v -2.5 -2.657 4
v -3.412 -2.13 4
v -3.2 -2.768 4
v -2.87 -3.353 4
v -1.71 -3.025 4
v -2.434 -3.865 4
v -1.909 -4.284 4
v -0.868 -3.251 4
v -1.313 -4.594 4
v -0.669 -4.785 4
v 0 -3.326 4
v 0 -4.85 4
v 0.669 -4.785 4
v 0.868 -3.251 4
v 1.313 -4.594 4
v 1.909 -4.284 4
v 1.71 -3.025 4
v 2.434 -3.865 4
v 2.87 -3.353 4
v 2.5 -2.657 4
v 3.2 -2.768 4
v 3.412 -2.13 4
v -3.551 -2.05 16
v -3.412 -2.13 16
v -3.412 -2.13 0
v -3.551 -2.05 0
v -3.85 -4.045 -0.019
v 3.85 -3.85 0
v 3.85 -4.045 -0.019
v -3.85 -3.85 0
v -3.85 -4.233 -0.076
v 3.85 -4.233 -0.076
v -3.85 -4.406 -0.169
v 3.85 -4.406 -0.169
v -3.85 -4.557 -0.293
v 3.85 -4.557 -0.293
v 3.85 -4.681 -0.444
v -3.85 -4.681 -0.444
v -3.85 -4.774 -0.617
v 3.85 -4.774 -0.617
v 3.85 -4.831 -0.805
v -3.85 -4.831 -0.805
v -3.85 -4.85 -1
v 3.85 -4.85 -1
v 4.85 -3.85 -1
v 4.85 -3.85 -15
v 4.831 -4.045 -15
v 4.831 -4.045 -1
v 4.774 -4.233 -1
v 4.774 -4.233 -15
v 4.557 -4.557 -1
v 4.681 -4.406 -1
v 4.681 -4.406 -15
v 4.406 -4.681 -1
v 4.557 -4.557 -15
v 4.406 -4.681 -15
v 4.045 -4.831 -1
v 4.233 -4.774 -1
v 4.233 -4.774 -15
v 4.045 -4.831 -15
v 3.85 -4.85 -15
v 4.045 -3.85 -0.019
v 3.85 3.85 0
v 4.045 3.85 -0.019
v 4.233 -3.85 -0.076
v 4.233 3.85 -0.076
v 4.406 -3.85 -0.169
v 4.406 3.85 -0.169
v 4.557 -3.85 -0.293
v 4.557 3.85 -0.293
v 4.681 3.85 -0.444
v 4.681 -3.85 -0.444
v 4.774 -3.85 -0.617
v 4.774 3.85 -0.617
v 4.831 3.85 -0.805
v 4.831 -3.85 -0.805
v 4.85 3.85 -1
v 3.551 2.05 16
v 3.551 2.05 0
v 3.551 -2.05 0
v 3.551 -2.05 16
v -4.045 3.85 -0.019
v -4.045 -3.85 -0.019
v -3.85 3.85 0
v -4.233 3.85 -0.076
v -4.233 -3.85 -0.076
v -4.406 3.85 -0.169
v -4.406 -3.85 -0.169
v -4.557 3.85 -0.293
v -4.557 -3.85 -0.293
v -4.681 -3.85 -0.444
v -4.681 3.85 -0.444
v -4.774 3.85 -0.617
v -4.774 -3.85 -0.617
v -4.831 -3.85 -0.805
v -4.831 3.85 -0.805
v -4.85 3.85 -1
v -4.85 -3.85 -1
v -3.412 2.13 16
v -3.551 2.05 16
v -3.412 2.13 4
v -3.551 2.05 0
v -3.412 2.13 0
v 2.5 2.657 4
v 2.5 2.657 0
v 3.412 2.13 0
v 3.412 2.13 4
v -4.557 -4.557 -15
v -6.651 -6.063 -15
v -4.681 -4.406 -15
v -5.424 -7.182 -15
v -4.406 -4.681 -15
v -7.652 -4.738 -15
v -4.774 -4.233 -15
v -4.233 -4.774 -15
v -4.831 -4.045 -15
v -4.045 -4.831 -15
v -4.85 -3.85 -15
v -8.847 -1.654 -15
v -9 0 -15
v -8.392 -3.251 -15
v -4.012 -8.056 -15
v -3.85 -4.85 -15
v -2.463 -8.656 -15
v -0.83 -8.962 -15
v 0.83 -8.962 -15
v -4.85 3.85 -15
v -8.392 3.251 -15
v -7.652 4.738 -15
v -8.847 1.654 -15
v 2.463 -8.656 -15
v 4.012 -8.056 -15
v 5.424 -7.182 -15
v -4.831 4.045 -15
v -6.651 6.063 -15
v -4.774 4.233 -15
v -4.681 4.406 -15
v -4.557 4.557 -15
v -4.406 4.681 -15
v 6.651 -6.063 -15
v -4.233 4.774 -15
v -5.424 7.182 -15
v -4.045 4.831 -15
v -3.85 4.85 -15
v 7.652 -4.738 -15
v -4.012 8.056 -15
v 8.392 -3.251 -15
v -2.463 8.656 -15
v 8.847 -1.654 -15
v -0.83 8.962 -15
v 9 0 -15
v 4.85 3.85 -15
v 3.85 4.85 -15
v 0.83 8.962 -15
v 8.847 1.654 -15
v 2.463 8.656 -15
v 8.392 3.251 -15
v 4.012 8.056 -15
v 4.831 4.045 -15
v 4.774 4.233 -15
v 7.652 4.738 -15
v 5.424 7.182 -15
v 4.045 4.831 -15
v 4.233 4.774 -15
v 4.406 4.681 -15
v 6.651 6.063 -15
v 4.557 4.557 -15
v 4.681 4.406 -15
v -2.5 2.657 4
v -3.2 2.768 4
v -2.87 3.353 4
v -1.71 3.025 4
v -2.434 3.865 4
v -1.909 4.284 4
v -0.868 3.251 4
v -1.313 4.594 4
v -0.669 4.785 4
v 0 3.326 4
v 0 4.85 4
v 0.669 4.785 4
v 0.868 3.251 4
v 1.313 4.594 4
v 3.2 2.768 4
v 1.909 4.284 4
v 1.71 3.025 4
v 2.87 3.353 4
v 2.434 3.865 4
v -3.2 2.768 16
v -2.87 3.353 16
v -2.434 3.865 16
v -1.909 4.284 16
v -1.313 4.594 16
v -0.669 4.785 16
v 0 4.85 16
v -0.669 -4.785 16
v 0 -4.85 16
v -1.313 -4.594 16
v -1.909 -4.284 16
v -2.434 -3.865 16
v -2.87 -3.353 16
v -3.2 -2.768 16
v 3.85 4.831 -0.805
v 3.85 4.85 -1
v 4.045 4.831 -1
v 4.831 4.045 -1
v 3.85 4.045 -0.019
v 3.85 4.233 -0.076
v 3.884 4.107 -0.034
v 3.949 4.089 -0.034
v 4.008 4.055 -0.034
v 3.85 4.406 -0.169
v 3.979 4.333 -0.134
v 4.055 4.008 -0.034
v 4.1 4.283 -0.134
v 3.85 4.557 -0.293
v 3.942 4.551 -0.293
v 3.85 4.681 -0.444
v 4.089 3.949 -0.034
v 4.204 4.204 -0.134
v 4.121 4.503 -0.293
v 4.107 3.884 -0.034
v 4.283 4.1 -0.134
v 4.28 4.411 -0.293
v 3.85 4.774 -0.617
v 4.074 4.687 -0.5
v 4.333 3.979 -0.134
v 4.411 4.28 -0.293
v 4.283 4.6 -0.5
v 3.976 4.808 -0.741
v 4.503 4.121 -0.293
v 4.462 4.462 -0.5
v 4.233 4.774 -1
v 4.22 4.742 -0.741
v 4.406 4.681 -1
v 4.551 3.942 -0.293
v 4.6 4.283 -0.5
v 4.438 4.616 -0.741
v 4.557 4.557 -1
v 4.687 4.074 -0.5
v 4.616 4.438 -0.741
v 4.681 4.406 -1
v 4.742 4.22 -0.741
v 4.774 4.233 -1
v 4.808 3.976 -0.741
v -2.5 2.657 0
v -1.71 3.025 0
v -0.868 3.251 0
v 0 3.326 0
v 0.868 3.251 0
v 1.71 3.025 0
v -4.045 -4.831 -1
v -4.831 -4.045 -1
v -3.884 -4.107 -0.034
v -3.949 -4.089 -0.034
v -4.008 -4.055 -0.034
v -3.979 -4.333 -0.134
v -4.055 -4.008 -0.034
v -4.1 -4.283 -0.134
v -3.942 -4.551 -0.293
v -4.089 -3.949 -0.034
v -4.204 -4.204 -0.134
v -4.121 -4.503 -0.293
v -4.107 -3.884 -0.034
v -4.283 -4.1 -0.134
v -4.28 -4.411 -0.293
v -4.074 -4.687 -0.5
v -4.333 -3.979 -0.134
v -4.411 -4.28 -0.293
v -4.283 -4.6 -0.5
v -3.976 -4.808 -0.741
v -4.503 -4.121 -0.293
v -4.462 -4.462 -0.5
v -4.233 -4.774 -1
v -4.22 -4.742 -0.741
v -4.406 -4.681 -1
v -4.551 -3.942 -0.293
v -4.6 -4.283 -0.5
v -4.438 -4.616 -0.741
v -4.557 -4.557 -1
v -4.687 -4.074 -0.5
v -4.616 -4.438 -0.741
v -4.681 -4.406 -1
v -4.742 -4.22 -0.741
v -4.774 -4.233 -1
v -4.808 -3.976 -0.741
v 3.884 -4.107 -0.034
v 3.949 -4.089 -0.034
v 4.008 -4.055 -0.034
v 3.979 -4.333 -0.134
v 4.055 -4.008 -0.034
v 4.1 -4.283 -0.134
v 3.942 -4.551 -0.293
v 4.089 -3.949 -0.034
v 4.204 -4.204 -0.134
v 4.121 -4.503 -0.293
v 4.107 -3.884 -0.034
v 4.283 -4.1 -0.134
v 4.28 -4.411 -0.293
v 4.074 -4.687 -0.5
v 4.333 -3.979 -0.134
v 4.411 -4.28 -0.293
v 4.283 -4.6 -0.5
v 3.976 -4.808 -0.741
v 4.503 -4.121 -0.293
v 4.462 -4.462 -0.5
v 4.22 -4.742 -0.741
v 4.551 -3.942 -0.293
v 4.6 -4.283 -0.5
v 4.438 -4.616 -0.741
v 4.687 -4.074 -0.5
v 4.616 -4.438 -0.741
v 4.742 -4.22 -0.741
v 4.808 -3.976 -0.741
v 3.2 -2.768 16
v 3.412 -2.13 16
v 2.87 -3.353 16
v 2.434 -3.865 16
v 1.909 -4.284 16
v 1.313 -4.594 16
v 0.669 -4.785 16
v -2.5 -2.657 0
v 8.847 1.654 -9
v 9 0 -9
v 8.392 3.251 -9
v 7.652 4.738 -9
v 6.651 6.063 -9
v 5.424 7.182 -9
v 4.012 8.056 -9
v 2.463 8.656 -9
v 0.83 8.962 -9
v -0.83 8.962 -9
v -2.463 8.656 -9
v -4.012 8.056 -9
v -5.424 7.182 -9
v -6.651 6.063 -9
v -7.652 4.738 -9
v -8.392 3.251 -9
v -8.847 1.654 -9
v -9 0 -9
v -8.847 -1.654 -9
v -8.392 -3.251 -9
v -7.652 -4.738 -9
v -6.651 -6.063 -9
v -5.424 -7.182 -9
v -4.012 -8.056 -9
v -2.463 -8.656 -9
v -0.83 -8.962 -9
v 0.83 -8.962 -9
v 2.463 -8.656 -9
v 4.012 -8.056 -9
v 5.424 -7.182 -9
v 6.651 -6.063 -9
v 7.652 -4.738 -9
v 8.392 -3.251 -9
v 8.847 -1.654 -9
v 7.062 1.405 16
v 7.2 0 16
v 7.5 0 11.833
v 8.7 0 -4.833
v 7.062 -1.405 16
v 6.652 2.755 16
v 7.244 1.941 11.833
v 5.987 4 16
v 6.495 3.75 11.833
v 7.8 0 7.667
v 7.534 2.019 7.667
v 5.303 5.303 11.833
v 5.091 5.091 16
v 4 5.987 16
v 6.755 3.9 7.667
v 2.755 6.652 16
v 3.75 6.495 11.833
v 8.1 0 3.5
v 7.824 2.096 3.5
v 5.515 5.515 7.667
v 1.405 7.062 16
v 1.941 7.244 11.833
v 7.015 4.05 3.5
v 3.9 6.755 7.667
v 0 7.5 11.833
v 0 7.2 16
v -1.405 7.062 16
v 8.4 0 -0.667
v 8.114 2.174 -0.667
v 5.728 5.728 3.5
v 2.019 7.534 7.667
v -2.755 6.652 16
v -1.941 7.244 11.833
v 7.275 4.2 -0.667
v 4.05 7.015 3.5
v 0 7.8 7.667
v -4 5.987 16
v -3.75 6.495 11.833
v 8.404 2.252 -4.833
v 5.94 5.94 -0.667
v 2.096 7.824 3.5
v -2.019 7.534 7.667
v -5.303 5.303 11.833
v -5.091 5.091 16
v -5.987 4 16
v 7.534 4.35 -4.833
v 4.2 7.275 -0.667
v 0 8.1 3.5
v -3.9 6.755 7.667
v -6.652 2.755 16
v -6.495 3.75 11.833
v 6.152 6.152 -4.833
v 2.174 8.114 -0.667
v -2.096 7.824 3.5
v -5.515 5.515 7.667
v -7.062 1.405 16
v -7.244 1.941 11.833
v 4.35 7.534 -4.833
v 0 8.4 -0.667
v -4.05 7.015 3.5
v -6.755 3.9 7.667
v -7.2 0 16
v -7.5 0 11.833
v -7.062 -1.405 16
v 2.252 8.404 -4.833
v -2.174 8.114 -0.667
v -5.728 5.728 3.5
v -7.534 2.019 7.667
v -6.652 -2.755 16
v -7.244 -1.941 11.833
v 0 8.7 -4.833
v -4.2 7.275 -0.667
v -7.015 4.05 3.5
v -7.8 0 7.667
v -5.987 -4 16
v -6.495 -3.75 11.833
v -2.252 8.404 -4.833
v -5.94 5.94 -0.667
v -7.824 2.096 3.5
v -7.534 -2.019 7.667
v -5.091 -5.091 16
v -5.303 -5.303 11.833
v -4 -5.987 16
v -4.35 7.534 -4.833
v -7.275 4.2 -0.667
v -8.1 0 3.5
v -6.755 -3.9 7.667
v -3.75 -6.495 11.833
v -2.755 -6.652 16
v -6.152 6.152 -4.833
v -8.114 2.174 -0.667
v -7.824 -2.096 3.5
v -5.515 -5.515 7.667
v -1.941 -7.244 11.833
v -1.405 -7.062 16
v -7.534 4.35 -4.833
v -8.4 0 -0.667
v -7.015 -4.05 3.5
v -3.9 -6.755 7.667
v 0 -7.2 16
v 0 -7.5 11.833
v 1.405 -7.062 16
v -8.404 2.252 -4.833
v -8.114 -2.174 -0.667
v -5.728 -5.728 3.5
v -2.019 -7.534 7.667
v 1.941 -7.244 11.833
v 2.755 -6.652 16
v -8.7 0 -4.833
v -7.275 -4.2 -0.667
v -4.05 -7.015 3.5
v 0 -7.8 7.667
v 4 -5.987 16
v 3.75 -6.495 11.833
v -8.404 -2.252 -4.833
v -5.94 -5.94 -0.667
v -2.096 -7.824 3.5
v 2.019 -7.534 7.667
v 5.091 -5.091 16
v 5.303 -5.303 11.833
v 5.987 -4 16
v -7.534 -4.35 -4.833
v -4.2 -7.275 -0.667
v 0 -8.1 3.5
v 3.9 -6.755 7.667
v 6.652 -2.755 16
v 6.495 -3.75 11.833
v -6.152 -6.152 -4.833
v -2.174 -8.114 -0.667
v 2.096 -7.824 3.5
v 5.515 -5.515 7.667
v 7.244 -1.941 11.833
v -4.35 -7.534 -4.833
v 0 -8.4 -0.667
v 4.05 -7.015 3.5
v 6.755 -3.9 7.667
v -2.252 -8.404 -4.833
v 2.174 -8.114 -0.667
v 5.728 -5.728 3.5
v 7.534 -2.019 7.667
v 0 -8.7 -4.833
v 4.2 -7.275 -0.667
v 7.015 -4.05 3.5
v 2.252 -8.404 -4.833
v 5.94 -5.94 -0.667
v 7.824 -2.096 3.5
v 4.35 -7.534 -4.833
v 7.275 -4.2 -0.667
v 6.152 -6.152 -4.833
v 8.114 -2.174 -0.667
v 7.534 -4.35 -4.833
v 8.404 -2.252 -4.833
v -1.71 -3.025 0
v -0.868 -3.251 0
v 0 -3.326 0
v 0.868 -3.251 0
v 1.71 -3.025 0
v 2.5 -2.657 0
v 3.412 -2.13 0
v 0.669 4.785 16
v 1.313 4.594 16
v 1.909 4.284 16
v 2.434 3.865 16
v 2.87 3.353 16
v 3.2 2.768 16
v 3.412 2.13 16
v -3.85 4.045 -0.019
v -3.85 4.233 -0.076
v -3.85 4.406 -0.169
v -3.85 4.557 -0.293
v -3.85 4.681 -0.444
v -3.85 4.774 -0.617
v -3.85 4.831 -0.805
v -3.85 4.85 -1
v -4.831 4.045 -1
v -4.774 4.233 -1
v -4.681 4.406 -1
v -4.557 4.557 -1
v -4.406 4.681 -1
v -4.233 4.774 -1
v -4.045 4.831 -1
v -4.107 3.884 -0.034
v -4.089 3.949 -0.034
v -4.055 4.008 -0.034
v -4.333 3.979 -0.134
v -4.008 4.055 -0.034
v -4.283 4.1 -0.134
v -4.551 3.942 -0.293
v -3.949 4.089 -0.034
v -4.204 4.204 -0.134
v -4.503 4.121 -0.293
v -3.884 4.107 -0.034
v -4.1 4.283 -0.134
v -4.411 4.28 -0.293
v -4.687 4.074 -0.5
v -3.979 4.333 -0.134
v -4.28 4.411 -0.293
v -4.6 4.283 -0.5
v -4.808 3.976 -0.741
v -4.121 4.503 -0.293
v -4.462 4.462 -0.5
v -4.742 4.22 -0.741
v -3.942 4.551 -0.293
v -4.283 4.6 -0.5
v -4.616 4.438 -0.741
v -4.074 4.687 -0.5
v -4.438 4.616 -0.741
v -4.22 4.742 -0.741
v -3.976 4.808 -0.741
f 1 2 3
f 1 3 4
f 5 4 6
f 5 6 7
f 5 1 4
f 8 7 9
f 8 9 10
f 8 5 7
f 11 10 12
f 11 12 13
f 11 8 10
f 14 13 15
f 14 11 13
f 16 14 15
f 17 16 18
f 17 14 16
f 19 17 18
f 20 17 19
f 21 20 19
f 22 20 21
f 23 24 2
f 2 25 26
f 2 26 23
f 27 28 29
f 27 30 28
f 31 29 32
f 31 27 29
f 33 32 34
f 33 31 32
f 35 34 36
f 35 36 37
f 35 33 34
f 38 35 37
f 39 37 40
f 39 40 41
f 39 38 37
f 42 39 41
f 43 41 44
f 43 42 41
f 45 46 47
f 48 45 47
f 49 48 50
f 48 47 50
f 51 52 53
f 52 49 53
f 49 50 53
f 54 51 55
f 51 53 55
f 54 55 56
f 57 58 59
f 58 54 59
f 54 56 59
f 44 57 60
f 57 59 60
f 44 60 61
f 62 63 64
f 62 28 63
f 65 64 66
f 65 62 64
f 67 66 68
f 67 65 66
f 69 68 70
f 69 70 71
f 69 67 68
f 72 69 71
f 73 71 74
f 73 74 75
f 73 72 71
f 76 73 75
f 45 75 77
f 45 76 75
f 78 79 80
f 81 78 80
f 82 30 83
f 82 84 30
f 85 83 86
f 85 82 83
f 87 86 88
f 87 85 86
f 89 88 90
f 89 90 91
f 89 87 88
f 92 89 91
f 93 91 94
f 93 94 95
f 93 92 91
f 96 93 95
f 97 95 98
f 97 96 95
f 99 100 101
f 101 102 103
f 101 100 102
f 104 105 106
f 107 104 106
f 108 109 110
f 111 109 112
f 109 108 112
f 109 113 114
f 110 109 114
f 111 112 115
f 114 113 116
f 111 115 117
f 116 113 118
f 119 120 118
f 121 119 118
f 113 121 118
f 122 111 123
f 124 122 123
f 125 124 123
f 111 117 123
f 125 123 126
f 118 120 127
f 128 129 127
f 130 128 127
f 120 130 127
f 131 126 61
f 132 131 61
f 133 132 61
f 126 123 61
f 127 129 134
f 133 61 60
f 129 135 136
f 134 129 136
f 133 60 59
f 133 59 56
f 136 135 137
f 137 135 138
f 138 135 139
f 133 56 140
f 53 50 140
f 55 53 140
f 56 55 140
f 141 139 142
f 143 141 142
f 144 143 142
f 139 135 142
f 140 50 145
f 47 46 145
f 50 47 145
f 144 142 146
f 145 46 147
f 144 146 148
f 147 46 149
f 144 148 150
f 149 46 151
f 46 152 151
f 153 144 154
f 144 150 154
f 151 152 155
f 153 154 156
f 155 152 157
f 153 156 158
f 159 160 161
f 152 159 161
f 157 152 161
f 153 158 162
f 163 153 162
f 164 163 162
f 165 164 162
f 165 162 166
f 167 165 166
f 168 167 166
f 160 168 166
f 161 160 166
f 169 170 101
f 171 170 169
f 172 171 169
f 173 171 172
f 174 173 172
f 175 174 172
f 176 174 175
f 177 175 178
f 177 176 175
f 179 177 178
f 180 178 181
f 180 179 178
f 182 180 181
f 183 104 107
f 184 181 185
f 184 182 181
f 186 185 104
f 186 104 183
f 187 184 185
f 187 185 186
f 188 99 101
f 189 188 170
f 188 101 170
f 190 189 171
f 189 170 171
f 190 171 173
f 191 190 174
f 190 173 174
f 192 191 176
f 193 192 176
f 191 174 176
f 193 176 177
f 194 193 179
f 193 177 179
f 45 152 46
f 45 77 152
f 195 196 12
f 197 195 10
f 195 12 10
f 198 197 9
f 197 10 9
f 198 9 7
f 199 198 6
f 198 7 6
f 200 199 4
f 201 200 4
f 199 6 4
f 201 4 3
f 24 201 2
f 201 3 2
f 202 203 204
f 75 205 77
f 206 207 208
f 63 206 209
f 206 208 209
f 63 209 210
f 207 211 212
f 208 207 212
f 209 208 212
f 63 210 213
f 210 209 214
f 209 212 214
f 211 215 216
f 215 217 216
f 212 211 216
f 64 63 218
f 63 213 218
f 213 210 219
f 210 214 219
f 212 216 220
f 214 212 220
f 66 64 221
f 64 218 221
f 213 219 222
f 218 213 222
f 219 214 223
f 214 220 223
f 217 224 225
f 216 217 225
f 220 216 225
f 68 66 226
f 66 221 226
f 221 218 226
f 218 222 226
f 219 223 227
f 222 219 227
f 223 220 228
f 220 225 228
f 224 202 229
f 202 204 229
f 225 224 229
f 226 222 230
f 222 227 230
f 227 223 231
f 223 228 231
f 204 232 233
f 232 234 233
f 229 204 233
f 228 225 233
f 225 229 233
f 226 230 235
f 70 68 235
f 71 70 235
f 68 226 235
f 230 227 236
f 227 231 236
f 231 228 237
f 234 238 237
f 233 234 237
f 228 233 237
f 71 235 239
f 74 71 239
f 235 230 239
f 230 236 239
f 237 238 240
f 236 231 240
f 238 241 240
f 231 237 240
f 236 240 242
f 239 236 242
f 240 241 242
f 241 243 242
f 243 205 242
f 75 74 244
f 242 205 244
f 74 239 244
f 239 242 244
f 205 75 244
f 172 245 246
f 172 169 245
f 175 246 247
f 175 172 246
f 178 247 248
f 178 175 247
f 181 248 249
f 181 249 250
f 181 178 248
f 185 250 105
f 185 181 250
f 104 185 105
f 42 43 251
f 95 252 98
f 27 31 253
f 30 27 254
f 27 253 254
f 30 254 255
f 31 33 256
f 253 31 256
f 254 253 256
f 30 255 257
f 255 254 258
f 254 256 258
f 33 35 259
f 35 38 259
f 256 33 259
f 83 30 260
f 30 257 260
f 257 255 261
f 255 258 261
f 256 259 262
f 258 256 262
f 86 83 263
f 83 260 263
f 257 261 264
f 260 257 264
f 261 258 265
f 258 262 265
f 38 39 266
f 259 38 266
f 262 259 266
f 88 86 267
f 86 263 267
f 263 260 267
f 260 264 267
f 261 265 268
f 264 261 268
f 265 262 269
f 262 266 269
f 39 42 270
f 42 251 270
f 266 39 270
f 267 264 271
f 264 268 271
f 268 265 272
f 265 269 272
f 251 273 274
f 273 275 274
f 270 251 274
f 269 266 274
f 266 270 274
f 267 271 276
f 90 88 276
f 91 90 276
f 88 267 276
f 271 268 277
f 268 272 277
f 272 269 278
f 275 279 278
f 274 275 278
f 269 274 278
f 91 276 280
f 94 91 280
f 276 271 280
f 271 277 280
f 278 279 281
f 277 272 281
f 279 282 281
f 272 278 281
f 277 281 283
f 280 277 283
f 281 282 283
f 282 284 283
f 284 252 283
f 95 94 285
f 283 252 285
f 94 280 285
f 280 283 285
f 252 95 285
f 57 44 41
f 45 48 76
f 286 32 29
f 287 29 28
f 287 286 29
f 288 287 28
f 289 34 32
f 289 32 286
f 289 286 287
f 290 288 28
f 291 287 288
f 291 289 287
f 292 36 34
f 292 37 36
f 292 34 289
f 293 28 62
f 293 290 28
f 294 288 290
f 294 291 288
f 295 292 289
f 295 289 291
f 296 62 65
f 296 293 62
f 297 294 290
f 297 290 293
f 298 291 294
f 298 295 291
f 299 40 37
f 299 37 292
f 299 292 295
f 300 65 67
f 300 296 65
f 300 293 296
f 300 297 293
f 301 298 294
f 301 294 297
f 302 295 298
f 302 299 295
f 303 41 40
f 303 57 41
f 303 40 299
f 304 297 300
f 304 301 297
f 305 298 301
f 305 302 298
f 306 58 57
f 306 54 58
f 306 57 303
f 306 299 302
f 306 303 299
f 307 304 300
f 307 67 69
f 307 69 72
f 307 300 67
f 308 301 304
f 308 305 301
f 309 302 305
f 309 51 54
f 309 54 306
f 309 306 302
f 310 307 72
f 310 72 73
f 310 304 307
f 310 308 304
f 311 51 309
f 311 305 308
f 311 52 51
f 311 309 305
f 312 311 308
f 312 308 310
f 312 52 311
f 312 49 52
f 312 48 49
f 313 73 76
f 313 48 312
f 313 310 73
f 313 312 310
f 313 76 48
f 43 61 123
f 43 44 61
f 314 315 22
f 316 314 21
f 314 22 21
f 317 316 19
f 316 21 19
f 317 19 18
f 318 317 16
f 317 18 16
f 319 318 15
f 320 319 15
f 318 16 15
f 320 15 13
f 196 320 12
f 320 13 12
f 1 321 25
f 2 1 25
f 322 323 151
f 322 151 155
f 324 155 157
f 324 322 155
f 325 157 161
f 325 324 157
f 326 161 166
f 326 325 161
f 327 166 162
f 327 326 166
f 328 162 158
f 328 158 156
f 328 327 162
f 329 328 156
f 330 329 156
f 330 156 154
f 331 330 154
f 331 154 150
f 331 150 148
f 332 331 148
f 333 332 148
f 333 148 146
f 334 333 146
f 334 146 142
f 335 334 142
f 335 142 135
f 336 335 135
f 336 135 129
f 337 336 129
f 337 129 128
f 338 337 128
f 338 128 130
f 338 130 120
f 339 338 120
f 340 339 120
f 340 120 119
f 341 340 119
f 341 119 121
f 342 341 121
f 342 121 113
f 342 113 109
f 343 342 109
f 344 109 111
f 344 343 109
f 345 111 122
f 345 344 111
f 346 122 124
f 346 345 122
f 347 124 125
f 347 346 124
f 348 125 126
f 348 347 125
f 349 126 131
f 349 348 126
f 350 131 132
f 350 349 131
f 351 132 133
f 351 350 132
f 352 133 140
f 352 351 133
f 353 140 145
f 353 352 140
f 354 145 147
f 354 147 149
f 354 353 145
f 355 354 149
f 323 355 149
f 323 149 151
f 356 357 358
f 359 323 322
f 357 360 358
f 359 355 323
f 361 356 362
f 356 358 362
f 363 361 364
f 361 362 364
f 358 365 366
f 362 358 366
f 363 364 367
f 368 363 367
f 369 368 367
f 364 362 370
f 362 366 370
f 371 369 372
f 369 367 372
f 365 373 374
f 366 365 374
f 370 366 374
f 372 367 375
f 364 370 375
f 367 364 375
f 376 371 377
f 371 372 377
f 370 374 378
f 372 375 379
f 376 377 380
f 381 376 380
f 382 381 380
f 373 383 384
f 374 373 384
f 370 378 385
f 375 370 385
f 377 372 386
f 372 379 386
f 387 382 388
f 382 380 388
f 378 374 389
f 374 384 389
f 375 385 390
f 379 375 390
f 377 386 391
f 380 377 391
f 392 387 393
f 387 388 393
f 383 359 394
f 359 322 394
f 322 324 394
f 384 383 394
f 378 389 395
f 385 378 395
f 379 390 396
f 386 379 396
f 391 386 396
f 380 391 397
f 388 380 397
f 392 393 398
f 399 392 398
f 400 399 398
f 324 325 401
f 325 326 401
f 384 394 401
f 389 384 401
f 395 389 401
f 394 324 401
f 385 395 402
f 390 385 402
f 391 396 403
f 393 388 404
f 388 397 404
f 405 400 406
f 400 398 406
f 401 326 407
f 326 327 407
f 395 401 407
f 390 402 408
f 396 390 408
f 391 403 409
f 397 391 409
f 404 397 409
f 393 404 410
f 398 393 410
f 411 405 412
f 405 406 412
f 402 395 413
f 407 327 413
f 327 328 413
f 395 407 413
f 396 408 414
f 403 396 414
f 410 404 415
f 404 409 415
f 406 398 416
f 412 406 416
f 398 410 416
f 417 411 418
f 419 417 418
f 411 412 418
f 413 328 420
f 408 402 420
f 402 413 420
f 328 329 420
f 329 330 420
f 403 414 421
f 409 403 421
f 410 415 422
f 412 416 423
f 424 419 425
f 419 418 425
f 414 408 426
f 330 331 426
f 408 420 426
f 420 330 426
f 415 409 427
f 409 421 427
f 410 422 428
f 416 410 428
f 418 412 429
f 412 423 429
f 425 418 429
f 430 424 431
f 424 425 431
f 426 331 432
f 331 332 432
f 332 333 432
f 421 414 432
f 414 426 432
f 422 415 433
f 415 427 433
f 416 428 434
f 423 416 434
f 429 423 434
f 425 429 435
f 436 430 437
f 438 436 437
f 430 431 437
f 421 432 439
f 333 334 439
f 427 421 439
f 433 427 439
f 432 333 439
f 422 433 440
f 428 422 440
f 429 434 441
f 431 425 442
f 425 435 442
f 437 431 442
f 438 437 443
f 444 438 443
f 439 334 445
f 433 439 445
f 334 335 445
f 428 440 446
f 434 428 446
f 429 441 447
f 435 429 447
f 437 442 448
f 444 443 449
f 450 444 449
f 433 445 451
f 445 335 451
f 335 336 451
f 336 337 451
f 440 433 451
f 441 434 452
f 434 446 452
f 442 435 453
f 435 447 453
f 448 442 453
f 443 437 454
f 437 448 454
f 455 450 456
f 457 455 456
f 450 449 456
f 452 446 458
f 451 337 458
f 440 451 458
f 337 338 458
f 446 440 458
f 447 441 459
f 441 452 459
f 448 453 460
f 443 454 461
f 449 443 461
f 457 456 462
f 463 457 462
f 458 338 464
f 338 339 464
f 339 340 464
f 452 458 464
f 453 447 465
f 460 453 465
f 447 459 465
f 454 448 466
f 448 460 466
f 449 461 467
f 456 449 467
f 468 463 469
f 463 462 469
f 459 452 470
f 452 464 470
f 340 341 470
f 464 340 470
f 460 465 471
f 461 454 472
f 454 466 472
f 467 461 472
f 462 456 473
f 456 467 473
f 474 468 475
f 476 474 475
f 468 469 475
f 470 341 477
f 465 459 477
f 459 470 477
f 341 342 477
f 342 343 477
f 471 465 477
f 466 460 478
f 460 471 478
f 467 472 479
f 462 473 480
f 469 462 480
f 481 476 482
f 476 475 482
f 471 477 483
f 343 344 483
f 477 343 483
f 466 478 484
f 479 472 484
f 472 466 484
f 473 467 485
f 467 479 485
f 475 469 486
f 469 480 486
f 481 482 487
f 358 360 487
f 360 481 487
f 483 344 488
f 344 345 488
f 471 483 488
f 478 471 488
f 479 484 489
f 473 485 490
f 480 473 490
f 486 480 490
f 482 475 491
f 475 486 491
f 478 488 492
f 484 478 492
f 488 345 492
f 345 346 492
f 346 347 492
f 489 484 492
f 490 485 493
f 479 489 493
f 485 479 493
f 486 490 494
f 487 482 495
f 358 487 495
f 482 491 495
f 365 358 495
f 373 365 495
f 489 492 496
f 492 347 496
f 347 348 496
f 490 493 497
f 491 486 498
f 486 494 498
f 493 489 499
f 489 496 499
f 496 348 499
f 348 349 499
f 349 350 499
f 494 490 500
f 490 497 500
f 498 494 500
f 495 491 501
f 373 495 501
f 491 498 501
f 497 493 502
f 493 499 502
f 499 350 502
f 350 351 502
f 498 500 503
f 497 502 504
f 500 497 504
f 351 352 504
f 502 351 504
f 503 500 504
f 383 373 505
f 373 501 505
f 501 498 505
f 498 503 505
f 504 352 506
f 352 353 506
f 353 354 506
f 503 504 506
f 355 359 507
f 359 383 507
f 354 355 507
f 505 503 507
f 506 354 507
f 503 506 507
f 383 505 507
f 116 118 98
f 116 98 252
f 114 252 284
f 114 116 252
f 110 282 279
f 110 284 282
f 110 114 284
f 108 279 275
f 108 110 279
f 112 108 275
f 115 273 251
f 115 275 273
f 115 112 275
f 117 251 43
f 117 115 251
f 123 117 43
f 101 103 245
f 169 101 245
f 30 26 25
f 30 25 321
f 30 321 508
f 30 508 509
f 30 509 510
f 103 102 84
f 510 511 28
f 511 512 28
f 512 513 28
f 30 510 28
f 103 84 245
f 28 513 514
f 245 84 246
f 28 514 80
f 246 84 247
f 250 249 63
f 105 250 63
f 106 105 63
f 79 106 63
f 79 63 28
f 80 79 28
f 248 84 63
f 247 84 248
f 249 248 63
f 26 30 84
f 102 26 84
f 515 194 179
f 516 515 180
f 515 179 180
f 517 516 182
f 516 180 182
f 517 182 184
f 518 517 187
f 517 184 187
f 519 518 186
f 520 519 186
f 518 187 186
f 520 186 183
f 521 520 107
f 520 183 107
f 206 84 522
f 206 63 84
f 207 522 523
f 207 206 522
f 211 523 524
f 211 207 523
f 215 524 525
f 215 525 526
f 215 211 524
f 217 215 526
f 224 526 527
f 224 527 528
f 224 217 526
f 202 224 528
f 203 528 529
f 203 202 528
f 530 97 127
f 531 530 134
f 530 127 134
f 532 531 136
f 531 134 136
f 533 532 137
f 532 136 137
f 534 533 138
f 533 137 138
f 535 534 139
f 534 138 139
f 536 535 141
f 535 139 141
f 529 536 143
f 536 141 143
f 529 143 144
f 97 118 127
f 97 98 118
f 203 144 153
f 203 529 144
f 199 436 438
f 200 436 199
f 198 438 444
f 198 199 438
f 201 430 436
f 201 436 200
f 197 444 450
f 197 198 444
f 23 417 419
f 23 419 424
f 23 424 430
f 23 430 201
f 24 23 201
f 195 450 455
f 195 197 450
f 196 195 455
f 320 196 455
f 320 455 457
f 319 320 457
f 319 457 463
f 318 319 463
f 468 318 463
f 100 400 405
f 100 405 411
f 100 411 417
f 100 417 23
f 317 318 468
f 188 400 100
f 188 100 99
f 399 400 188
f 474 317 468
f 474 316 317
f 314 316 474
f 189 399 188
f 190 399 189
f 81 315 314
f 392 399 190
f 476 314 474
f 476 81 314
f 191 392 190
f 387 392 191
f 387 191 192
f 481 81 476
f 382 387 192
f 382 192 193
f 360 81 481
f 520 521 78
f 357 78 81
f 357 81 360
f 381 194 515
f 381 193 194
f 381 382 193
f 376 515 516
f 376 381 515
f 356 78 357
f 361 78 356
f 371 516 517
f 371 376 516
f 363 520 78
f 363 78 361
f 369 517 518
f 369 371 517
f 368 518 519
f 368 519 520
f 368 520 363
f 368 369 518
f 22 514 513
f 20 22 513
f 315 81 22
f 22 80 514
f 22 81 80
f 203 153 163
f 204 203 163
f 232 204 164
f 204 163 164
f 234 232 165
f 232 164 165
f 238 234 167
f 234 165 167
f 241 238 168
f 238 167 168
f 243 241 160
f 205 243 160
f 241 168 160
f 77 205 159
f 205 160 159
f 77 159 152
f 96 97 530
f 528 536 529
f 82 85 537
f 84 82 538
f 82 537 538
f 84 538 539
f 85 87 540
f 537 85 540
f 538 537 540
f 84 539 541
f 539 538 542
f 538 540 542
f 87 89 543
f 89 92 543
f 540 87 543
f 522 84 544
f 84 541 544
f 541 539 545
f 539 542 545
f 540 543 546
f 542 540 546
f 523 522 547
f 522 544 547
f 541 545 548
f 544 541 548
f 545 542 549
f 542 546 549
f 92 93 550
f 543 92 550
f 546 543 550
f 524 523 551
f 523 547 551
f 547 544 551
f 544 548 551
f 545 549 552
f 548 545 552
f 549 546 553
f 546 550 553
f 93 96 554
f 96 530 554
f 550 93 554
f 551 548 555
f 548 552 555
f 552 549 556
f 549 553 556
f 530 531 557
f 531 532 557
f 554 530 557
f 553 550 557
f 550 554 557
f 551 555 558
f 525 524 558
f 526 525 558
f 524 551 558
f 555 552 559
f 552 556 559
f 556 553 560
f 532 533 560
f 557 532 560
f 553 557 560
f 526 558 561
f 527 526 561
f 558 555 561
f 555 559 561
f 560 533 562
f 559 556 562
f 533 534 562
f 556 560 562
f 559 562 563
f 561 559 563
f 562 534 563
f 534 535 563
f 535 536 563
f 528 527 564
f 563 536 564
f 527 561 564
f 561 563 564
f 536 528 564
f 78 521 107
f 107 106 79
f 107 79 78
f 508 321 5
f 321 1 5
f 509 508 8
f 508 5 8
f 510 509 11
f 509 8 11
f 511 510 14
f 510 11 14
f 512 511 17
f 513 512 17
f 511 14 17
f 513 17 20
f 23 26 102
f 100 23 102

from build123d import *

# Parameters (mm, degrees)
F0_R     = 9
F1_DEPTH = 16
F2_DEPTH = 4
F3_DEPTH = 15
F4_R     = 5
F5_R     = 1
F6_SIZE2 = 25
F6_SIZE  = 1.8


with BuildPart() as f1:
    # F0 (on Top) → F1 (new body)
    with BuildSketch(Plane.XY):
        Circle(F0_R)
        Polygon((-4.85, 4.85), (0, 4.85), (4.85, 4.85), (4.85, -4.85), (0, -4.85), (-4.85, -4.85), align=None, mode=Mode.SUBTRACT)
        with BuildLine():
            Line((3.4119543857, 2.130107217), (3.5507041555, 2.05))
            Line((3.5507041555, 2.05), (3.5507041555, -2.05))
            Line((3.5507041555, -2.05), (3.4119543857, -2.130107217))
            ThreePointArc((3.4119543857, -2.130107217), (2.1816994225, -4.0868207157), (0, -4.85))
            Line((0, -4.85), (4.85, -4.85))
            Line((4.85, -4.85), (4.85, 4.85))
            Line((4.85, 4.85), (0, 4.85))
            ThreePointArc((0, 4.85), (2.1816994225, 4.0868207157), (3.4119543857, 2.130107217))
        make_face()
        with BuildLine():
            ThreePointArc((-3.4119543857, 2.130107217), (-2.1816994225, 4.0868207157), (0, 4.85))
            Line((0, 4.85), (-4.85, 4.85))
            Line((-4.85, 4.85), (-4.85, -4.85))
            Line((-4.85, -4.85), (0, -4.85))
            ThreePointArc((0, -4.85), (-2.1816994225, -4.0868207157), (-3.4119543857, -2.130107217))
            Line((-3.4119543857, -2.130107217), (-3.5507041555, -2.05))
            Line((-3.5507041555, -2.05), (-3.5507041555, 2.05))
            Line((-3.5507041555, 2.05), (-3.4119543857, 2.130107217))
        make_face()
    extrude(amount=F1_DEPTH)

    # F0 (on Top) → F2 (join)
    with BuildSketch(Plane.XY):
        with BuildLine():
            ThreePointArc((0, -4.85), (2.1816994225, -4.0868207157), (3.4119543857, -2.130107217))
            Line((3.4119543857, -2.130107217), (0, -4.1))
            Line((0, -4.1), (-3.4119543857, -2.130107217))
            ThreePointArc((-3.4119543857, -2.130107217), (-2.1816994225, -4.0868207157), (0, -4.85))
        make_face()
        with BuildLine():
            Line((0, 4.1), (3.4119543857, 2.130107217))
            ThreePointArc((3.4119543857, 2.130107217), (2.1816994225, 4.0868207157), (0, 4.85))
            ThreePointArc((0, 4.85), (-2.1816994225, 4.0868207157), (-3.4119543857, 2.130107217))
            Line((-3.4119543857, 2.130107217), (0, 4.1))
        make_face()
    extrude(amount=F2_DEPTH)

    # F0 (on Top) → F3 (join)
    with BuildSketch(Plane.XY):
        Circle(F0_R)
        Polygon((-4.85, 4.85), (0, 4.85), (4.85, 4.85), (4.85, -4.85), (0, -4.85), (-4.85, -4.85), align=None, mode=Mode.SUBTRACT)
    extrude(amount=-F3_DEPTH)

    # F4
    f4_edges = [f1.edges().sort_by_distance(p)[0] for p in [
        (0, -4.1, 2),
        (0, 4.1, 2),
    ]]
    fillet(f4_edges, radius=F4_R)

    # F5
    f5_edges = [f1.edges().sort_by_distance(p)[0] for p in [
        (-4.85, -4.85, -7.5),
        (4.85, -4.85, -7.5),
        (4.85, 4.85, -7.5),
        (-4.85, 4.85, -7.5),
        (0, -4.85, 0),
        (-4.85, 0, 0),
        (0, 4.85, 0),
        (4.85, 0, 0),
    ]]
    fillet(f5_edges, radius=F5_R)

    # F6
    f6_edges = [f1.edges().sort_by_distance(p)[0] for p in [
        (-9, 0, 16),
    ]]
    f6_side = f1.faces().sort_by_distance((3.608608, 2.310508, 16))[0]
    chamfer(f6_edges, length=F6_SIZE, length2=F6_SIZE2, reference=f6_side)


solid = f1.part
